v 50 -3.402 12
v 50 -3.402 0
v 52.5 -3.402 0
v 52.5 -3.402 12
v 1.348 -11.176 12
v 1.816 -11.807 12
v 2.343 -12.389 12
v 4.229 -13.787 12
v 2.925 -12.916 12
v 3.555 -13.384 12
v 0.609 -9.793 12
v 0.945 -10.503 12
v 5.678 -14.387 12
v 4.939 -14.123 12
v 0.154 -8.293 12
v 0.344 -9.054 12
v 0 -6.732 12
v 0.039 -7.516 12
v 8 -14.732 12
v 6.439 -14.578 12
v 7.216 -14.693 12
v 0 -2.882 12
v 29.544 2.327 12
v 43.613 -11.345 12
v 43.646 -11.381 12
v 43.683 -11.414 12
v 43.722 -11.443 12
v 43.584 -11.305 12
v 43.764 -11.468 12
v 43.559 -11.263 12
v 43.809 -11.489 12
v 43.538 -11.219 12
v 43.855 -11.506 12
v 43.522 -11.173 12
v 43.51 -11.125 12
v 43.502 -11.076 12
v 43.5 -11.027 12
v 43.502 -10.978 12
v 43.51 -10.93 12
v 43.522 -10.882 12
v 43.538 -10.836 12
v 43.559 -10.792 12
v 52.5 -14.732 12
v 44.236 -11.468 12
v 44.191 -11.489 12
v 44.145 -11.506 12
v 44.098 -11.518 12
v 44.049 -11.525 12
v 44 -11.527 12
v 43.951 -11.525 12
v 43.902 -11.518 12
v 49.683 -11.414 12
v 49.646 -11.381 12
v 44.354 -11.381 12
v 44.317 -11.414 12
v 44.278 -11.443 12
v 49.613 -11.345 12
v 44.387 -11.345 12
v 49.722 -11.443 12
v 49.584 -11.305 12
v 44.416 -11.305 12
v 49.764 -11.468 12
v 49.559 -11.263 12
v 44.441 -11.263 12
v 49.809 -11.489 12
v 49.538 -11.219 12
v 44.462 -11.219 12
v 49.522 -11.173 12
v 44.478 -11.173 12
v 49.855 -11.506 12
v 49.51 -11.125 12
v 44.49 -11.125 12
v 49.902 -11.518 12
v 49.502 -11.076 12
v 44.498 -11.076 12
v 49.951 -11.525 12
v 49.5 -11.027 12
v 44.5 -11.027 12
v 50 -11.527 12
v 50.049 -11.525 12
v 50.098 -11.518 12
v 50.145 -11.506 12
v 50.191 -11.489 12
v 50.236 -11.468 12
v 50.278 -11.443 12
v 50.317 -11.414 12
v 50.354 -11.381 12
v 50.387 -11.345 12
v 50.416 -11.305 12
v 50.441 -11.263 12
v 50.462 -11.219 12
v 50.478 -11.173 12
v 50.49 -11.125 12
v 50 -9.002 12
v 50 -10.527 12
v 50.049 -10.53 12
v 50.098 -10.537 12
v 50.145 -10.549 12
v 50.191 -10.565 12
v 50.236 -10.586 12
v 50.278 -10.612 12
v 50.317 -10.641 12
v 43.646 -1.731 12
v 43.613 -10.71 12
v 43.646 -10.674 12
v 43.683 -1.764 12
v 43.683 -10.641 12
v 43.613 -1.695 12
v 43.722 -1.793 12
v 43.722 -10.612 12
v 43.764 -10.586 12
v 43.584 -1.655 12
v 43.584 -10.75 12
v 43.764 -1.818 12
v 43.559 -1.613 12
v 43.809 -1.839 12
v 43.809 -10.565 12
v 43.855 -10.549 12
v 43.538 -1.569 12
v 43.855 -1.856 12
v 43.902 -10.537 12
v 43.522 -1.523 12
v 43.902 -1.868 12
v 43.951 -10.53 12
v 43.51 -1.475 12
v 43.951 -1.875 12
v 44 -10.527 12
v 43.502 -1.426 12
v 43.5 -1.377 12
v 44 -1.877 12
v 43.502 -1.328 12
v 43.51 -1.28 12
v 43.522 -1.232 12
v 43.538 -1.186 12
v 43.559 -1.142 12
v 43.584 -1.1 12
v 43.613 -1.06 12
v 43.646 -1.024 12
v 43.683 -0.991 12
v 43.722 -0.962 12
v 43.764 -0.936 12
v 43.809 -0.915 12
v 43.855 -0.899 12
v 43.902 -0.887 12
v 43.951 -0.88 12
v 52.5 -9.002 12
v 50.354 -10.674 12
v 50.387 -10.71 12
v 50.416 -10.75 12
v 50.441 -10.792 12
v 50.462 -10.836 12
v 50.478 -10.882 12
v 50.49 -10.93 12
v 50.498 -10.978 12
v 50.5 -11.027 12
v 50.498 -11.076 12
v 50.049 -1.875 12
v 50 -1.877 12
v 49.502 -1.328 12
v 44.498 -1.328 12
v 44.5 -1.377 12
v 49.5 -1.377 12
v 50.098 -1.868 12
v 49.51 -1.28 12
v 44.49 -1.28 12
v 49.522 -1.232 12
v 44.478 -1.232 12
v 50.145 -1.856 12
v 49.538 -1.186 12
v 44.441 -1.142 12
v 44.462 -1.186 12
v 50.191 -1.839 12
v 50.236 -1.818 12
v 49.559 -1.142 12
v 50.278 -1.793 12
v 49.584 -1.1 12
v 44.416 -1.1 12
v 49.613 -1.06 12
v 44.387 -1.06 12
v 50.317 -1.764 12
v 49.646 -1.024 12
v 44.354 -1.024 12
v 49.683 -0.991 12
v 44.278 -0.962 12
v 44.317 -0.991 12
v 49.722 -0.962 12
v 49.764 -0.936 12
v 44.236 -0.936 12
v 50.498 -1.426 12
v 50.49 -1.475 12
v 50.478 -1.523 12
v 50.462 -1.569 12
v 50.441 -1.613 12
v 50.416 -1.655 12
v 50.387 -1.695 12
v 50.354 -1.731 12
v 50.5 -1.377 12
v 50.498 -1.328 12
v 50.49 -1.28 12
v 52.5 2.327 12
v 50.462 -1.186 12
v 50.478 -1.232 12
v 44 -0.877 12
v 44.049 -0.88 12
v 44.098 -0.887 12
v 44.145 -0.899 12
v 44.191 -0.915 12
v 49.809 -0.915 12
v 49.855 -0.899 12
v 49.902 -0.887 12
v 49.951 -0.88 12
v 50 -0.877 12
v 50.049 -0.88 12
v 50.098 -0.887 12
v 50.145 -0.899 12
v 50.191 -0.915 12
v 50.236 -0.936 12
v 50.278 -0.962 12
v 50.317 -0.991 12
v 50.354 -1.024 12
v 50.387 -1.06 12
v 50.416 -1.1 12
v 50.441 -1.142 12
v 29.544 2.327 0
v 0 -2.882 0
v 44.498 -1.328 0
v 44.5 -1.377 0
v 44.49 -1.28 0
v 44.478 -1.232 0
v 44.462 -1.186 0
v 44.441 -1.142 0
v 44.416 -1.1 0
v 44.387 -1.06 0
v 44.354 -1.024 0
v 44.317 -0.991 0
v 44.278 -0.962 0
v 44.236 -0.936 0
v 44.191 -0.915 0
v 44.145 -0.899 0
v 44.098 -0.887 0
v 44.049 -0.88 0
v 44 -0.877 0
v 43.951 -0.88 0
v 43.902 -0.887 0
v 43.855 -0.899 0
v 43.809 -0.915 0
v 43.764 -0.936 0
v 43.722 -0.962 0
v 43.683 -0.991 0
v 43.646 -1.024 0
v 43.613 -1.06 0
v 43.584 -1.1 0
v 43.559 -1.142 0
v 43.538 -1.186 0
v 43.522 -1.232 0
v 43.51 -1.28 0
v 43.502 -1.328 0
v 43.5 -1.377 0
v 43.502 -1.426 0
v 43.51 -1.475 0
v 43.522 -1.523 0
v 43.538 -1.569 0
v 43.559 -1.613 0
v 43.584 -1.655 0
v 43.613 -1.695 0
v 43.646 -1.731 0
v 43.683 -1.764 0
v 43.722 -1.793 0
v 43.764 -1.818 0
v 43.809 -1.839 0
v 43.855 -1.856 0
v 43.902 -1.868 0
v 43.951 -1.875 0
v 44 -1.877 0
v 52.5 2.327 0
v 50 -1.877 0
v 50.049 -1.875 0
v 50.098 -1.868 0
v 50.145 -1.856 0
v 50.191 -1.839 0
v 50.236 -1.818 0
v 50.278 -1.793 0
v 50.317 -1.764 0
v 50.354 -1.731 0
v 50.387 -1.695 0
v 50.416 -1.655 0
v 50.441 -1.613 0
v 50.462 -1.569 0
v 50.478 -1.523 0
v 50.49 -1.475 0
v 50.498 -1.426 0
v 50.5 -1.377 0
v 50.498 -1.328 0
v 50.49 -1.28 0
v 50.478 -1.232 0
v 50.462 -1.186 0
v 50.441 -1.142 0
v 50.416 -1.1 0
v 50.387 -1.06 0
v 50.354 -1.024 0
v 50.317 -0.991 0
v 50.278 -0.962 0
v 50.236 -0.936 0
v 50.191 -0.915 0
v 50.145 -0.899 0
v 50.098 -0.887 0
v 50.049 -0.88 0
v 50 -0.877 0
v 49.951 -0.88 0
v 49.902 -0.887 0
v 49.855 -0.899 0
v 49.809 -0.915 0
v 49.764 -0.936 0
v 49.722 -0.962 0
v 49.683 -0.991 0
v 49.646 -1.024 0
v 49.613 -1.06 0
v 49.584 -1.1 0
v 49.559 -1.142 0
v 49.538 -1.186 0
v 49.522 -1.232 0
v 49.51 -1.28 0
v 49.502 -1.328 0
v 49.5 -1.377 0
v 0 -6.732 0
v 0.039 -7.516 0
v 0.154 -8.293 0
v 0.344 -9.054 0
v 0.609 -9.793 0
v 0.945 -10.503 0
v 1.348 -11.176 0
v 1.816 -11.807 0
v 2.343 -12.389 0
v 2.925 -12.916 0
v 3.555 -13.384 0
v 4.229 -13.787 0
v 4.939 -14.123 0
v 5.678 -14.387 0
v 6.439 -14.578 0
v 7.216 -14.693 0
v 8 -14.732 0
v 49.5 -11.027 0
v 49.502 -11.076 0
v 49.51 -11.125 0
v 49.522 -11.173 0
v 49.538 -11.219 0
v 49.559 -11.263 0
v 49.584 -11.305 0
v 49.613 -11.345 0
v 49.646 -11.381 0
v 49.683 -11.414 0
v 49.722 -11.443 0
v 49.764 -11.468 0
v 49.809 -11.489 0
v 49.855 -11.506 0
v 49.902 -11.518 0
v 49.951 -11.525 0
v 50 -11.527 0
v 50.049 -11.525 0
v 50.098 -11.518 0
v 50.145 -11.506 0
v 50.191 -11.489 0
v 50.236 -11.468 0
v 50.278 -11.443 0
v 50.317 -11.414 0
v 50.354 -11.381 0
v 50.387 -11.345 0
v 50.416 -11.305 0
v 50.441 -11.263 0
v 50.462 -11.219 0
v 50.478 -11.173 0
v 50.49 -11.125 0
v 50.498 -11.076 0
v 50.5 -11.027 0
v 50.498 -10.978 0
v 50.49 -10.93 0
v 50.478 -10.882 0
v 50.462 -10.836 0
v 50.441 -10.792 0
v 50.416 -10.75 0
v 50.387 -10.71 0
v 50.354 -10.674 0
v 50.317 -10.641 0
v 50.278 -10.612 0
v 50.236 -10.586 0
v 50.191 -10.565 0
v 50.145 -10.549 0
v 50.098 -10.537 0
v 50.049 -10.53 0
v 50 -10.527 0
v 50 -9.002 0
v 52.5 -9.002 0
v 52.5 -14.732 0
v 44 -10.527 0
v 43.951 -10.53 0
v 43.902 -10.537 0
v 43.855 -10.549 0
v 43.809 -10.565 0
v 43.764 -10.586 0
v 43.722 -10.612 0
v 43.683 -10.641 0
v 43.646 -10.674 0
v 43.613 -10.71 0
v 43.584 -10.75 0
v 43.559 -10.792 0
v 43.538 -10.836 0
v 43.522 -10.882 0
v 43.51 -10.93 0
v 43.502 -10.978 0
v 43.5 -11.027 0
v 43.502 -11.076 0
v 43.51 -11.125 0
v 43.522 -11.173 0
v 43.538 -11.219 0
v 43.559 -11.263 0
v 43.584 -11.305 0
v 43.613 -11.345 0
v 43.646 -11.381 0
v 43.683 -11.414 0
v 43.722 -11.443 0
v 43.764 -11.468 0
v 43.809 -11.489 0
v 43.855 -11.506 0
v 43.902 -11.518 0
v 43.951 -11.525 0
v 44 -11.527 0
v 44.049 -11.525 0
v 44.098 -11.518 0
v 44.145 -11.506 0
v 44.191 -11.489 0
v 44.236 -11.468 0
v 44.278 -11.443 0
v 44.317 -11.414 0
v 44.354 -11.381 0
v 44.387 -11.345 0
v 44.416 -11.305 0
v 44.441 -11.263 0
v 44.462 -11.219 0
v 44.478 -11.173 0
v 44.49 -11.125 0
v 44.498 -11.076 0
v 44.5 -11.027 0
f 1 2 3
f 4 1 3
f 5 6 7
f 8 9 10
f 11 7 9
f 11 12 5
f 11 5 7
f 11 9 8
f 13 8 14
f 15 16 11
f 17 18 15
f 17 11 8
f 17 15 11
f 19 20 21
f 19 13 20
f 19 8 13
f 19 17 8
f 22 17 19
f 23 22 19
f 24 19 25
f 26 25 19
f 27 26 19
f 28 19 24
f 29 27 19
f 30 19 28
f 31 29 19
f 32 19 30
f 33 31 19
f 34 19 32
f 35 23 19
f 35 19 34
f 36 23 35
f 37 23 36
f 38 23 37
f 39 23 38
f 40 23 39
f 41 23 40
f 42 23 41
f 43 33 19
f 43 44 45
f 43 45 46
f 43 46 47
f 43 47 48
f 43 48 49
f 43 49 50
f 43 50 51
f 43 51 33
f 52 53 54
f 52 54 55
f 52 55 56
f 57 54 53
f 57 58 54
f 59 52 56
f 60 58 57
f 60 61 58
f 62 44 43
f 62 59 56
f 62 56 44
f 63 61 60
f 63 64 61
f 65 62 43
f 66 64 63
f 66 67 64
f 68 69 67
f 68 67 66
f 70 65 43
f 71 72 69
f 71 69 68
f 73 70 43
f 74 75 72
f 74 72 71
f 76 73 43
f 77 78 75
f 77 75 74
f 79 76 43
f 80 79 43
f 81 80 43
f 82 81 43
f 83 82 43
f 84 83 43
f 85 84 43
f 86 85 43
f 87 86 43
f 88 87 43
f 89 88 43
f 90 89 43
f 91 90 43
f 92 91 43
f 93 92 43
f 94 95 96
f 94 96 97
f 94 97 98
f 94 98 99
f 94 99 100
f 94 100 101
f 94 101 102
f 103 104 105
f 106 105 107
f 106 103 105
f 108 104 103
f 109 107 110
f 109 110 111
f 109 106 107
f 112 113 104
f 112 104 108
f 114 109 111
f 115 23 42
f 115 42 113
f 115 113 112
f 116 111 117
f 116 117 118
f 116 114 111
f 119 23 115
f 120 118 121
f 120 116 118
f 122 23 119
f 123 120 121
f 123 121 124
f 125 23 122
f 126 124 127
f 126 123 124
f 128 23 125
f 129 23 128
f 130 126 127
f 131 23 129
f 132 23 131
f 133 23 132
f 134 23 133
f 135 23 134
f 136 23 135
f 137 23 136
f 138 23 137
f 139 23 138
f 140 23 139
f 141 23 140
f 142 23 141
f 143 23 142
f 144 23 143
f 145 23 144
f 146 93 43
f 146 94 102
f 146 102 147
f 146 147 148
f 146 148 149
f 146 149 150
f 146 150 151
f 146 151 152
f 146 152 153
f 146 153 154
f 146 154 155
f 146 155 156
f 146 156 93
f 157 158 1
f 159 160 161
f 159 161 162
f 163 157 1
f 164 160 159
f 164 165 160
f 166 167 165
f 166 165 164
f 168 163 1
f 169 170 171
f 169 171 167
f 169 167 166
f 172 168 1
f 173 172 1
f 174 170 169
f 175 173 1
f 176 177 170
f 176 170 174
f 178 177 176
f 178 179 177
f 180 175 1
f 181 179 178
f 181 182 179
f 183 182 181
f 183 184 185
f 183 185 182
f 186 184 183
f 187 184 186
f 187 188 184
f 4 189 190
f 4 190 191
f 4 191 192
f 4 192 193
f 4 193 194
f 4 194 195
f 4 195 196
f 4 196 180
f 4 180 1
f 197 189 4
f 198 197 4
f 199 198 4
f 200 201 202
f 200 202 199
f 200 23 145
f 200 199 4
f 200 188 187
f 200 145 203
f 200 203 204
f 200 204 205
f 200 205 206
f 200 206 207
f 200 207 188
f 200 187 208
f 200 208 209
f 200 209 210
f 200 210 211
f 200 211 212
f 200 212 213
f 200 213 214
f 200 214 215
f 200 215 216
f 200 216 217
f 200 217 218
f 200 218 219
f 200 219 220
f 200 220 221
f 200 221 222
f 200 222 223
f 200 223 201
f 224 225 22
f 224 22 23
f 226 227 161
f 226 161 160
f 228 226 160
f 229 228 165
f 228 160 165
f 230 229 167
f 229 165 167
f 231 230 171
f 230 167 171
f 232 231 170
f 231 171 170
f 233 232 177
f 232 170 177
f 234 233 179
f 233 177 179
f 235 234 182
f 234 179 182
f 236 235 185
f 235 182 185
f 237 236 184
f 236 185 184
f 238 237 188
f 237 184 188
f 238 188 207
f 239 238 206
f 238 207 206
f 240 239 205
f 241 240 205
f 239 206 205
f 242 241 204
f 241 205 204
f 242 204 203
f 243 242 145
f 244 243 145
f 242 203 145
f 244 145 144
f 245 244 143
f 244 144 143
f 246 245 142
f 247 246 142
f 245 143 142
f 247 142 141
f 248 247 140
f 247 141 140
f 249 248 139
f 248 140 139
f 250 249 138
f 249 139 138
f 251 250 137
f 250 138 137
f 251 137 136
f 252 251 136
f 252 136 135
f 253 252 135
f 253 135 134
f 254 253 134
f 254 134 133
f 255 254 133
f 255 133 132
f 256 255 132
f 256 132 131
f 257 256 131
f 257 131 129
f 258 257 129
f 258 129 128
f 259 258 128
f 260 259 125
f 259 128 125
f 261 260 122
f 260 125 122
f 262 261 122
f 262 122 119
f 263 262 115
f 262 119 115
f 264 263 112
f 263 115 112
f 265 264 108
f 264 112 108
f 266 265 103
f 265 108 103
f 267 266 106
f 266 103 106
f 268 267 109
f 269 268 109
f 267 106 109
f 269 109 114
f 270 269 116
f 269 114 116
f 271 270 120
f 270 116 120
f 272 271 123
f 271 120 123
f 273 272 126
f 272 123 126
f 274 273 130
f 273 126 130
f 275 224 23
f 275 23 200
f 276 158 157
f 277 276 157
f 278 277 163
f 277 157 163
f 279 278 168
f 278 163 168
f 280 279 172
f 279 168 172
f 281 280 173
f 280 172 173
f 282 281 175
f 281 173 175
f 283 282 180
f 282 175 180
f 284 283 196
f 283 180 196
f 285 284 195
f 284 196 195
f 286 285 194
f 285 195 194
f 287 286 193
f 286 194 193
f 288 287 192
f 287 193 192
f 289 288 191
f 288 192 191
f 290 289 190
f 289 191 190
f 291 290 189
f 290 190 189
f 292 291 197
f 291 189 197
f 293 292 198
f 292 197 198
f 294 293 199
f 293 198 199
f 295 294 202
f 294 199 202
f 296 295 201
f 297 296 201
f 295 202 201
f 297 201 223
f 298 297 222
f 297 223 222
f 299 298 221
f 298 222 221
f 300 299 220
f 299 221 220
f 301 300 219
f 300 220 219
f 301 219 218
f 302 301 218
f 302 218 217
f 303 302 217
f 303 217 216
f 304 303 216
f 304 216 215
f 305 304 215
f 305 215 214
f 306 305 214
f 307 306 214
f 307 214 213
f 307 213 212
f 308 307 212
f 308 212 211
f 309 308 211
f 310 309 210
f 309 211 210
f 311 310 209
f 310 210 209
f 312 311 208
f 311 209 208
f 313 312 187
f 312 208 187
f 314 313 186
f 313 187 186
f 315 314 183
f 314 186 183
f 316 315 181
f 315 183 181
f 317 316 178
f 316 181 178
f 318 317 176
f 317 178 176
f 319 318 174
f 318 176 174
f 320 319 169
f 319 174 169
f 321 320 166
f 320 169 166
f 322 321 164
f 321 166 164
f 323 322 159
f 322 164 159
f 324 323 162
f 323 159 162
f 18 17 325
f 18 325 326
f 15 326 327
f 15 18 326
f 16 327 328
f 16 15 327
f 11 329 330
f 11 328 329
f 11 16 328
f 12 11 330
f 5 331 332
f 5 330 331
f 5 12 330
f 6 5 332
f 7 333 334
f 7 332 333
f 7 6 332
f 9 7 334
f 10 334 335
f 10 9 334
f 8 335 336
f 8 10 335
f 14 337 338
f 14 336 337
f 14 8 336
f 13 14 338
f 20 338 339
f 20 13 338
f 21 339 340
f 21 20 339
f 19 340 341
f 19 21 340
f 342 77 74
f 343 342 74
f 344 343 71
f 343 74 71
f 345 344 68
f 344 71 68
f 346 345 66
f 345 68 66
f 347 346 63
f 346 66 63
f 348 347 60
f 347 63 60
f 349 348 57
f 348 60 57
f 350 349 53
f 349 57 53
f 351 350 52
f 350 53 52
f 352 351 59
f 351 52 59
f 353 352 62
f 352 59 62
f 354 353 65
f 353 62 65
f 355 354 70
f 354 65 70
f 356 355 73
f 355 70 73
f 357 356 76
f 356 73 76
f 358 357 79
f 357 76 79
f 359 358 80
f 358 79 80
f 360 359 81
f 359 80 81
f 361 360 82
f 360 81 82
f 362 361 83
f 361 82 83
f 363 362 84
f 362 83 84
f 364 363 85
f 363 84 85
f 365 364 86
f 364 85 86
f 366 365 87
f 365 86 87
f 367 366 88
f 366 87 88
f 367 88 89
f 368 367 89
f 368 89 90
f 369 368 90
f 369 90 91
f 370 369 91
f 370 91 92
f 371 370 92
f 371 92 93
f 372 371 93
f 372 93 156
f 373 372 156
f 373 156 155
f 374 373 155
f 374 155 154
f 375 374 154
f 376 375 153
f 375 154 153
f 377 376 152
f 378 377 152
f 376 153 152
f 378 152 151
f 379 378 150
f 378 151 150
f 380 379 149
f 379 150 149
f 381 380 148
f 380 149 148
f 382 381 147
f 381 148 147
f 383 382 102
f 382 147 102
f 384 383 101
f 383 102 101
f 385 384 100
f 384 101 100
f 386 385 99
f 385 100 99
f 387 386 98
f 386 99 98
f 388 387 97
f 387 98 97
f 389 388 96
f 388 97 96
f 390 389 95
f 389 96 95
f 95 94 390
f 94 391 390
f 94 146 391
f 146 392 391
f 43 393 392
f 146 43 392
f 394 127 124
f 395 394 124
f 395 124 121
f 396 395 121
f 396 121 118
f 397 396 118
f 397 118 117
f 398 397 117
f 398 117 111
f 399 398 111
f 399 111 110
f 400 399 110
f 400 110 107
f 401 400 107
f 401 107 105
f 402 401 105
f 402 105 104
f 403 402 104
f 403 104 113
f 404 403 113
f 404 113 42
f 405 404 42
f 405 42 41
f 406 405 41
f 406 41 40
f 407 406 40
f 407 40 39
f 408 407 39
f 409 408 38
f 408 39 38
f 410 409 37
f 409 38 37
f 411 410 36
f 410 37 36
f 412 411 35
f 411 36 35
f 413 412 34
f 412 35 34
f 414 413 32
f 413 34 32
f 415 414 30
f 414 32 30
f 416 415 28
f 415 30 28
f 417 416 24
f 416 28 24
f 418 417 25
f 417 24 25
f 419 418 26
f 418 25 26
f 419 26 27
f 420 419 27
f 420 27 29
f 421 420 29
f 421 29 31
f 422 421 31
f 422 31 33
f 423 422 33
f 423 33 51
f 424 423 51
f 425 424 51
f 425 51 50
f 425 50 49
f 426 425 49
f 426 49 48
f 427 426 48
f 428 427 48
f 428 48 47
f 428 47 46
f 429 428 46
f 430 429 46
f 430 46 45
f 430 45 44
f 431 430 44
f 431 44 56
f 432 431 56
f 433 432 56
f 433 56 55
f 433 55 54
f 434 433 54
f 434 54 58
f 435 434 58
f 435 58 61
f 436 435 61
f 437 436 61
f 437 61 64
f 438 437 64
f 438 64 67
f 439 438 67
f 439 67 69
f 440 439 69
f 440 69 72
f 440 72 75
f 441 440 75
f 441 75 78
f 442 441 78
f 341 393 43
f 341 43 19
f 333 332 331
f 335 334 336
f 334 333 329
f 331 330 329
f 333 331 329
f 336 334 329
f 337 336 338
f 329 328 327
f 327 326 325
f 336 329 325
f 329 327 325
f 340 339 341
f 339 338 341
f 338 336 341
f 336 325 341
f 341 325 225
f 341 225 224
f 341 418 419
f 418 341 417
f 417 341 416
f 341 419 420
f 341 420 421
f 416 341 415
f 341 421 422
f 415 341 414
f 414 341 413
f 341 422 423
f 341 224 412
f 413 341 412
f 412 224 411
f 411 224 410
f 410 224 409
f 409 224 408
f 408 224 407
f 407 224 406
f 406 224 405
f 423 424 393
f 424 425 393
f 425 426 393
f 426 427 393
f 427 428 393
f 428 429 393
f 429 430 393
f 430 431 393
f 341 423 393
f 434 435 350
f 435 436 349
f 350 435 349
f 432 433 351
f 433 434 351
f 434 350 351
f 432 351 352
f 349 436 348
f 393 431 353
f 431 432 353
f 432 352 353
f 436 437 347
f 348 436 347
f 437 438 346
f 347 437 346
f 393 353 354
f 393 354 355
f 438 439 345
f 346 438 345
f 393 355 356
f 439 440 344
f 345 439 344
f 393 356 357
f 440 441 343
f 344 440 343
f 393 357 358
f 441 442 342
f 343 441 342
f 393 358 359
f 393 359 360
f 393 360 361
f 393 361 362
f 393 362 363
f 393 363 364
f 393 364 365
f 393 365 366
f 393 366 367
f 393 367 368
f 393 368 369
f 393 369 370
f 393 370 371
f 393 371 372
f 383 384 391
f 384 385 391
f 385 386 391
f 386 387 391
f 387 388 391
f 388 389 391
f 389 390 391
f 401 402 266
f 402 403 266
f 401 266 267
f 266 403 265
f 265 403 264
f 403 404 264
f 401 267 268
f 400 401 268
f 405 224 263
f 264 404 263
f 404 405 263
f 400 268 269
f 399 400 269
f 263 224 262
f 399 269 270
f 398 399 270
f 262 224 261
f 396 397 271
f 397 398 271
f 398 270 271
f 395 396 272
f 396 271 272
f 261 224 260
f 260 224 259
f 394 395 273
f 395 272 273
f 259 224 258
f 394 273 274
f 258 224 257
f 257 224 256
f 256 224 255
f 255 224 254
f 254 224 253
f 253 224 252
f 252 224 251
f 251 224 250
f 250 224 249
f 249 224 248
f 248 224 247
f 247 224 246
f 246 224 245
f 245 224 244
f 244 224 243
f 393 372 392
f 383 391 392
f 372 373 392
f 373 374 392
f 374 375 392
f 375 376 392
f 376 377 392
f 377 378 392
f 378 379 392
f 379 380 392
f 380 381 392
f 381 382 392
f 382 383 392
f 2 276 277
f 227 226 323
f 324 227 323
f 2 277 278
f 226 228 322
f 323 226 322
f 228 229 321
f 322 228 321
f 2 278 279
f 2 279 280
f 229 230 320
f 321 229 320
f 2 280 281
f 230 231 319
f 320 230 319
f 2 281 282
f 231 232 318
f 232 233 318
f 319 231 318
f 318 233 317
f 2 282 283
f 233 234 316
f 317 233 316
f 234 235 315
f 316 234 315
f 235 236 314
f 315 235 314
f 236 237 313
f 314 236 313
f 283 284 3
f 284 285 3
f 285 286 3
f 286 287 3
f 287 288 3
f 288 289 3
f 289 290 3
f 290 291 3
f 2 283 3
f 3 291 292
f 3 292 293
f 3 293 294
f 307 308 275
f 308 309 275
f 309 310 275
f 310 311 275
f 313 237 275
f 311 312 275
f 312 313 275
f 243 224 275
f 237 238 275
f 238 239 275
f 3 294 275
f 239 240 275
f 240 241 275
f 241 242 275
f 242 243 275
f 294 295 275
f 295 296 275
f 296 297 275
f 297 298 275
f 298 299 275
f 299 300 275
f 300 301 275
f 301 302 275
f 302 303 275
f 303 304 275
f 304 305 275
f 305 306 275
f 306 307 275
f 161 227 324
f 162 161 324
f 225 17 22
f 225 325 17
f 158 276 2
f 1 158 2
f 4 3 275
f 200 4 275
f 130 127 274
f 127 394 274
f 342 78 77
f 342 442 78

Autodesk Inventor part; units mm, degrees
ref_plane "YZ Plane" through (0, 0, 0) normal (1, 0, 0) x (0, 1, 0)
ref_plane "XZ Plane" through (0, 0, 0) normal (0, 1, 0) x (-1, 0, 0)
ref_plane "XY Plane" through (0, 0, 0) normal (0, 0, 1) x (1, 0, 0)
sketch "Sketch5" plane through (0, 0, 0) normal (0, 0, 1) x (1, 0, 0)
  line L0 (52.5, -14.7318) -> (52.5, -9.0024)
  line L1 (52.5, -9.0024) -> (50, -9.0024)
  line L2 (50, -9.0024) -> (50, -11.0274)
  line L3 (44, -11.0274) -> (44, -1.3774)
  line L4 (50, -1.3774) -> (50, -3.4024)
  line L5 (50, -3.4024) -> (52.5, -3.4024)
  line L6 (52.5, -3.4024) -> (52.5, 2.327)
  line L7 (44, -1.3774) -> (50, -1.3774)
  line L8 (44, -11.0274) -> (50, -11.0274)
  line L9 (52.5, -14.7318) -> (44, -14.7318)
  line L10 (40.2429, -14.7318) -> (44, -14.7318)
  line L11 (0, -14.7318) -> (40.2429, -14.7318)
  line L12 (0, -14.7318) -> (0, -2.8824)
  line L13 (0, -2.8824) -> (29.5442, 2.327)
  line L14 (29.5442, 2.327) -> (52.5, 2.327)
  point P0 (0, 0)
  dimension "d41" = 6
  dimension "d48" = 44
  dimension "d50" = 2.5
  dimension "d87" = 5.6
  dimension "d88" = 9.65
  dimension "d115" = 10
  dimension "d116" = 30
  dimension "d117" = 0
extrude "Extrusion2" add sketch "Sketch5" along normal blind 12
sketch "Sketch11" plane through (0, 0, 12) normal (0, 0, 1) x (1, 0, 0)
  line L0 (44, -1.3774) -> (50, -1.3774) projected
  circle A0 centre (44, -1.3774) radius 0.5
  line L1 (44, -11.0274) -> (44, -1.3774) projected
  circle A1 centre (44, -11.0274) radius 0.5
  line L2 (50, -11.0274) -> (44, -11.0274) projected
  circle A2 centre (50, -11.0274) radius 0.5
  line L3 (50, -1.3774) -> (50, -3.4024) projected
  circle A3 centre (50, -1.3774) radius 0.5
  point P0 (0, 0)
  dimension "d99" = 1
  dimension "d100" = 1
  dimension "d101" = 1
  dimension "d102" = 1
extrude "Extrusion7" cut sketch "Sketch11" against normal through all
fillet "Rundung4" radius 8 1 edges at (0, -14.7318, 6)
equation "\"l1\" = 8"
properties part number "Maria_Greifer_Dreieck2_3D-Druck"
